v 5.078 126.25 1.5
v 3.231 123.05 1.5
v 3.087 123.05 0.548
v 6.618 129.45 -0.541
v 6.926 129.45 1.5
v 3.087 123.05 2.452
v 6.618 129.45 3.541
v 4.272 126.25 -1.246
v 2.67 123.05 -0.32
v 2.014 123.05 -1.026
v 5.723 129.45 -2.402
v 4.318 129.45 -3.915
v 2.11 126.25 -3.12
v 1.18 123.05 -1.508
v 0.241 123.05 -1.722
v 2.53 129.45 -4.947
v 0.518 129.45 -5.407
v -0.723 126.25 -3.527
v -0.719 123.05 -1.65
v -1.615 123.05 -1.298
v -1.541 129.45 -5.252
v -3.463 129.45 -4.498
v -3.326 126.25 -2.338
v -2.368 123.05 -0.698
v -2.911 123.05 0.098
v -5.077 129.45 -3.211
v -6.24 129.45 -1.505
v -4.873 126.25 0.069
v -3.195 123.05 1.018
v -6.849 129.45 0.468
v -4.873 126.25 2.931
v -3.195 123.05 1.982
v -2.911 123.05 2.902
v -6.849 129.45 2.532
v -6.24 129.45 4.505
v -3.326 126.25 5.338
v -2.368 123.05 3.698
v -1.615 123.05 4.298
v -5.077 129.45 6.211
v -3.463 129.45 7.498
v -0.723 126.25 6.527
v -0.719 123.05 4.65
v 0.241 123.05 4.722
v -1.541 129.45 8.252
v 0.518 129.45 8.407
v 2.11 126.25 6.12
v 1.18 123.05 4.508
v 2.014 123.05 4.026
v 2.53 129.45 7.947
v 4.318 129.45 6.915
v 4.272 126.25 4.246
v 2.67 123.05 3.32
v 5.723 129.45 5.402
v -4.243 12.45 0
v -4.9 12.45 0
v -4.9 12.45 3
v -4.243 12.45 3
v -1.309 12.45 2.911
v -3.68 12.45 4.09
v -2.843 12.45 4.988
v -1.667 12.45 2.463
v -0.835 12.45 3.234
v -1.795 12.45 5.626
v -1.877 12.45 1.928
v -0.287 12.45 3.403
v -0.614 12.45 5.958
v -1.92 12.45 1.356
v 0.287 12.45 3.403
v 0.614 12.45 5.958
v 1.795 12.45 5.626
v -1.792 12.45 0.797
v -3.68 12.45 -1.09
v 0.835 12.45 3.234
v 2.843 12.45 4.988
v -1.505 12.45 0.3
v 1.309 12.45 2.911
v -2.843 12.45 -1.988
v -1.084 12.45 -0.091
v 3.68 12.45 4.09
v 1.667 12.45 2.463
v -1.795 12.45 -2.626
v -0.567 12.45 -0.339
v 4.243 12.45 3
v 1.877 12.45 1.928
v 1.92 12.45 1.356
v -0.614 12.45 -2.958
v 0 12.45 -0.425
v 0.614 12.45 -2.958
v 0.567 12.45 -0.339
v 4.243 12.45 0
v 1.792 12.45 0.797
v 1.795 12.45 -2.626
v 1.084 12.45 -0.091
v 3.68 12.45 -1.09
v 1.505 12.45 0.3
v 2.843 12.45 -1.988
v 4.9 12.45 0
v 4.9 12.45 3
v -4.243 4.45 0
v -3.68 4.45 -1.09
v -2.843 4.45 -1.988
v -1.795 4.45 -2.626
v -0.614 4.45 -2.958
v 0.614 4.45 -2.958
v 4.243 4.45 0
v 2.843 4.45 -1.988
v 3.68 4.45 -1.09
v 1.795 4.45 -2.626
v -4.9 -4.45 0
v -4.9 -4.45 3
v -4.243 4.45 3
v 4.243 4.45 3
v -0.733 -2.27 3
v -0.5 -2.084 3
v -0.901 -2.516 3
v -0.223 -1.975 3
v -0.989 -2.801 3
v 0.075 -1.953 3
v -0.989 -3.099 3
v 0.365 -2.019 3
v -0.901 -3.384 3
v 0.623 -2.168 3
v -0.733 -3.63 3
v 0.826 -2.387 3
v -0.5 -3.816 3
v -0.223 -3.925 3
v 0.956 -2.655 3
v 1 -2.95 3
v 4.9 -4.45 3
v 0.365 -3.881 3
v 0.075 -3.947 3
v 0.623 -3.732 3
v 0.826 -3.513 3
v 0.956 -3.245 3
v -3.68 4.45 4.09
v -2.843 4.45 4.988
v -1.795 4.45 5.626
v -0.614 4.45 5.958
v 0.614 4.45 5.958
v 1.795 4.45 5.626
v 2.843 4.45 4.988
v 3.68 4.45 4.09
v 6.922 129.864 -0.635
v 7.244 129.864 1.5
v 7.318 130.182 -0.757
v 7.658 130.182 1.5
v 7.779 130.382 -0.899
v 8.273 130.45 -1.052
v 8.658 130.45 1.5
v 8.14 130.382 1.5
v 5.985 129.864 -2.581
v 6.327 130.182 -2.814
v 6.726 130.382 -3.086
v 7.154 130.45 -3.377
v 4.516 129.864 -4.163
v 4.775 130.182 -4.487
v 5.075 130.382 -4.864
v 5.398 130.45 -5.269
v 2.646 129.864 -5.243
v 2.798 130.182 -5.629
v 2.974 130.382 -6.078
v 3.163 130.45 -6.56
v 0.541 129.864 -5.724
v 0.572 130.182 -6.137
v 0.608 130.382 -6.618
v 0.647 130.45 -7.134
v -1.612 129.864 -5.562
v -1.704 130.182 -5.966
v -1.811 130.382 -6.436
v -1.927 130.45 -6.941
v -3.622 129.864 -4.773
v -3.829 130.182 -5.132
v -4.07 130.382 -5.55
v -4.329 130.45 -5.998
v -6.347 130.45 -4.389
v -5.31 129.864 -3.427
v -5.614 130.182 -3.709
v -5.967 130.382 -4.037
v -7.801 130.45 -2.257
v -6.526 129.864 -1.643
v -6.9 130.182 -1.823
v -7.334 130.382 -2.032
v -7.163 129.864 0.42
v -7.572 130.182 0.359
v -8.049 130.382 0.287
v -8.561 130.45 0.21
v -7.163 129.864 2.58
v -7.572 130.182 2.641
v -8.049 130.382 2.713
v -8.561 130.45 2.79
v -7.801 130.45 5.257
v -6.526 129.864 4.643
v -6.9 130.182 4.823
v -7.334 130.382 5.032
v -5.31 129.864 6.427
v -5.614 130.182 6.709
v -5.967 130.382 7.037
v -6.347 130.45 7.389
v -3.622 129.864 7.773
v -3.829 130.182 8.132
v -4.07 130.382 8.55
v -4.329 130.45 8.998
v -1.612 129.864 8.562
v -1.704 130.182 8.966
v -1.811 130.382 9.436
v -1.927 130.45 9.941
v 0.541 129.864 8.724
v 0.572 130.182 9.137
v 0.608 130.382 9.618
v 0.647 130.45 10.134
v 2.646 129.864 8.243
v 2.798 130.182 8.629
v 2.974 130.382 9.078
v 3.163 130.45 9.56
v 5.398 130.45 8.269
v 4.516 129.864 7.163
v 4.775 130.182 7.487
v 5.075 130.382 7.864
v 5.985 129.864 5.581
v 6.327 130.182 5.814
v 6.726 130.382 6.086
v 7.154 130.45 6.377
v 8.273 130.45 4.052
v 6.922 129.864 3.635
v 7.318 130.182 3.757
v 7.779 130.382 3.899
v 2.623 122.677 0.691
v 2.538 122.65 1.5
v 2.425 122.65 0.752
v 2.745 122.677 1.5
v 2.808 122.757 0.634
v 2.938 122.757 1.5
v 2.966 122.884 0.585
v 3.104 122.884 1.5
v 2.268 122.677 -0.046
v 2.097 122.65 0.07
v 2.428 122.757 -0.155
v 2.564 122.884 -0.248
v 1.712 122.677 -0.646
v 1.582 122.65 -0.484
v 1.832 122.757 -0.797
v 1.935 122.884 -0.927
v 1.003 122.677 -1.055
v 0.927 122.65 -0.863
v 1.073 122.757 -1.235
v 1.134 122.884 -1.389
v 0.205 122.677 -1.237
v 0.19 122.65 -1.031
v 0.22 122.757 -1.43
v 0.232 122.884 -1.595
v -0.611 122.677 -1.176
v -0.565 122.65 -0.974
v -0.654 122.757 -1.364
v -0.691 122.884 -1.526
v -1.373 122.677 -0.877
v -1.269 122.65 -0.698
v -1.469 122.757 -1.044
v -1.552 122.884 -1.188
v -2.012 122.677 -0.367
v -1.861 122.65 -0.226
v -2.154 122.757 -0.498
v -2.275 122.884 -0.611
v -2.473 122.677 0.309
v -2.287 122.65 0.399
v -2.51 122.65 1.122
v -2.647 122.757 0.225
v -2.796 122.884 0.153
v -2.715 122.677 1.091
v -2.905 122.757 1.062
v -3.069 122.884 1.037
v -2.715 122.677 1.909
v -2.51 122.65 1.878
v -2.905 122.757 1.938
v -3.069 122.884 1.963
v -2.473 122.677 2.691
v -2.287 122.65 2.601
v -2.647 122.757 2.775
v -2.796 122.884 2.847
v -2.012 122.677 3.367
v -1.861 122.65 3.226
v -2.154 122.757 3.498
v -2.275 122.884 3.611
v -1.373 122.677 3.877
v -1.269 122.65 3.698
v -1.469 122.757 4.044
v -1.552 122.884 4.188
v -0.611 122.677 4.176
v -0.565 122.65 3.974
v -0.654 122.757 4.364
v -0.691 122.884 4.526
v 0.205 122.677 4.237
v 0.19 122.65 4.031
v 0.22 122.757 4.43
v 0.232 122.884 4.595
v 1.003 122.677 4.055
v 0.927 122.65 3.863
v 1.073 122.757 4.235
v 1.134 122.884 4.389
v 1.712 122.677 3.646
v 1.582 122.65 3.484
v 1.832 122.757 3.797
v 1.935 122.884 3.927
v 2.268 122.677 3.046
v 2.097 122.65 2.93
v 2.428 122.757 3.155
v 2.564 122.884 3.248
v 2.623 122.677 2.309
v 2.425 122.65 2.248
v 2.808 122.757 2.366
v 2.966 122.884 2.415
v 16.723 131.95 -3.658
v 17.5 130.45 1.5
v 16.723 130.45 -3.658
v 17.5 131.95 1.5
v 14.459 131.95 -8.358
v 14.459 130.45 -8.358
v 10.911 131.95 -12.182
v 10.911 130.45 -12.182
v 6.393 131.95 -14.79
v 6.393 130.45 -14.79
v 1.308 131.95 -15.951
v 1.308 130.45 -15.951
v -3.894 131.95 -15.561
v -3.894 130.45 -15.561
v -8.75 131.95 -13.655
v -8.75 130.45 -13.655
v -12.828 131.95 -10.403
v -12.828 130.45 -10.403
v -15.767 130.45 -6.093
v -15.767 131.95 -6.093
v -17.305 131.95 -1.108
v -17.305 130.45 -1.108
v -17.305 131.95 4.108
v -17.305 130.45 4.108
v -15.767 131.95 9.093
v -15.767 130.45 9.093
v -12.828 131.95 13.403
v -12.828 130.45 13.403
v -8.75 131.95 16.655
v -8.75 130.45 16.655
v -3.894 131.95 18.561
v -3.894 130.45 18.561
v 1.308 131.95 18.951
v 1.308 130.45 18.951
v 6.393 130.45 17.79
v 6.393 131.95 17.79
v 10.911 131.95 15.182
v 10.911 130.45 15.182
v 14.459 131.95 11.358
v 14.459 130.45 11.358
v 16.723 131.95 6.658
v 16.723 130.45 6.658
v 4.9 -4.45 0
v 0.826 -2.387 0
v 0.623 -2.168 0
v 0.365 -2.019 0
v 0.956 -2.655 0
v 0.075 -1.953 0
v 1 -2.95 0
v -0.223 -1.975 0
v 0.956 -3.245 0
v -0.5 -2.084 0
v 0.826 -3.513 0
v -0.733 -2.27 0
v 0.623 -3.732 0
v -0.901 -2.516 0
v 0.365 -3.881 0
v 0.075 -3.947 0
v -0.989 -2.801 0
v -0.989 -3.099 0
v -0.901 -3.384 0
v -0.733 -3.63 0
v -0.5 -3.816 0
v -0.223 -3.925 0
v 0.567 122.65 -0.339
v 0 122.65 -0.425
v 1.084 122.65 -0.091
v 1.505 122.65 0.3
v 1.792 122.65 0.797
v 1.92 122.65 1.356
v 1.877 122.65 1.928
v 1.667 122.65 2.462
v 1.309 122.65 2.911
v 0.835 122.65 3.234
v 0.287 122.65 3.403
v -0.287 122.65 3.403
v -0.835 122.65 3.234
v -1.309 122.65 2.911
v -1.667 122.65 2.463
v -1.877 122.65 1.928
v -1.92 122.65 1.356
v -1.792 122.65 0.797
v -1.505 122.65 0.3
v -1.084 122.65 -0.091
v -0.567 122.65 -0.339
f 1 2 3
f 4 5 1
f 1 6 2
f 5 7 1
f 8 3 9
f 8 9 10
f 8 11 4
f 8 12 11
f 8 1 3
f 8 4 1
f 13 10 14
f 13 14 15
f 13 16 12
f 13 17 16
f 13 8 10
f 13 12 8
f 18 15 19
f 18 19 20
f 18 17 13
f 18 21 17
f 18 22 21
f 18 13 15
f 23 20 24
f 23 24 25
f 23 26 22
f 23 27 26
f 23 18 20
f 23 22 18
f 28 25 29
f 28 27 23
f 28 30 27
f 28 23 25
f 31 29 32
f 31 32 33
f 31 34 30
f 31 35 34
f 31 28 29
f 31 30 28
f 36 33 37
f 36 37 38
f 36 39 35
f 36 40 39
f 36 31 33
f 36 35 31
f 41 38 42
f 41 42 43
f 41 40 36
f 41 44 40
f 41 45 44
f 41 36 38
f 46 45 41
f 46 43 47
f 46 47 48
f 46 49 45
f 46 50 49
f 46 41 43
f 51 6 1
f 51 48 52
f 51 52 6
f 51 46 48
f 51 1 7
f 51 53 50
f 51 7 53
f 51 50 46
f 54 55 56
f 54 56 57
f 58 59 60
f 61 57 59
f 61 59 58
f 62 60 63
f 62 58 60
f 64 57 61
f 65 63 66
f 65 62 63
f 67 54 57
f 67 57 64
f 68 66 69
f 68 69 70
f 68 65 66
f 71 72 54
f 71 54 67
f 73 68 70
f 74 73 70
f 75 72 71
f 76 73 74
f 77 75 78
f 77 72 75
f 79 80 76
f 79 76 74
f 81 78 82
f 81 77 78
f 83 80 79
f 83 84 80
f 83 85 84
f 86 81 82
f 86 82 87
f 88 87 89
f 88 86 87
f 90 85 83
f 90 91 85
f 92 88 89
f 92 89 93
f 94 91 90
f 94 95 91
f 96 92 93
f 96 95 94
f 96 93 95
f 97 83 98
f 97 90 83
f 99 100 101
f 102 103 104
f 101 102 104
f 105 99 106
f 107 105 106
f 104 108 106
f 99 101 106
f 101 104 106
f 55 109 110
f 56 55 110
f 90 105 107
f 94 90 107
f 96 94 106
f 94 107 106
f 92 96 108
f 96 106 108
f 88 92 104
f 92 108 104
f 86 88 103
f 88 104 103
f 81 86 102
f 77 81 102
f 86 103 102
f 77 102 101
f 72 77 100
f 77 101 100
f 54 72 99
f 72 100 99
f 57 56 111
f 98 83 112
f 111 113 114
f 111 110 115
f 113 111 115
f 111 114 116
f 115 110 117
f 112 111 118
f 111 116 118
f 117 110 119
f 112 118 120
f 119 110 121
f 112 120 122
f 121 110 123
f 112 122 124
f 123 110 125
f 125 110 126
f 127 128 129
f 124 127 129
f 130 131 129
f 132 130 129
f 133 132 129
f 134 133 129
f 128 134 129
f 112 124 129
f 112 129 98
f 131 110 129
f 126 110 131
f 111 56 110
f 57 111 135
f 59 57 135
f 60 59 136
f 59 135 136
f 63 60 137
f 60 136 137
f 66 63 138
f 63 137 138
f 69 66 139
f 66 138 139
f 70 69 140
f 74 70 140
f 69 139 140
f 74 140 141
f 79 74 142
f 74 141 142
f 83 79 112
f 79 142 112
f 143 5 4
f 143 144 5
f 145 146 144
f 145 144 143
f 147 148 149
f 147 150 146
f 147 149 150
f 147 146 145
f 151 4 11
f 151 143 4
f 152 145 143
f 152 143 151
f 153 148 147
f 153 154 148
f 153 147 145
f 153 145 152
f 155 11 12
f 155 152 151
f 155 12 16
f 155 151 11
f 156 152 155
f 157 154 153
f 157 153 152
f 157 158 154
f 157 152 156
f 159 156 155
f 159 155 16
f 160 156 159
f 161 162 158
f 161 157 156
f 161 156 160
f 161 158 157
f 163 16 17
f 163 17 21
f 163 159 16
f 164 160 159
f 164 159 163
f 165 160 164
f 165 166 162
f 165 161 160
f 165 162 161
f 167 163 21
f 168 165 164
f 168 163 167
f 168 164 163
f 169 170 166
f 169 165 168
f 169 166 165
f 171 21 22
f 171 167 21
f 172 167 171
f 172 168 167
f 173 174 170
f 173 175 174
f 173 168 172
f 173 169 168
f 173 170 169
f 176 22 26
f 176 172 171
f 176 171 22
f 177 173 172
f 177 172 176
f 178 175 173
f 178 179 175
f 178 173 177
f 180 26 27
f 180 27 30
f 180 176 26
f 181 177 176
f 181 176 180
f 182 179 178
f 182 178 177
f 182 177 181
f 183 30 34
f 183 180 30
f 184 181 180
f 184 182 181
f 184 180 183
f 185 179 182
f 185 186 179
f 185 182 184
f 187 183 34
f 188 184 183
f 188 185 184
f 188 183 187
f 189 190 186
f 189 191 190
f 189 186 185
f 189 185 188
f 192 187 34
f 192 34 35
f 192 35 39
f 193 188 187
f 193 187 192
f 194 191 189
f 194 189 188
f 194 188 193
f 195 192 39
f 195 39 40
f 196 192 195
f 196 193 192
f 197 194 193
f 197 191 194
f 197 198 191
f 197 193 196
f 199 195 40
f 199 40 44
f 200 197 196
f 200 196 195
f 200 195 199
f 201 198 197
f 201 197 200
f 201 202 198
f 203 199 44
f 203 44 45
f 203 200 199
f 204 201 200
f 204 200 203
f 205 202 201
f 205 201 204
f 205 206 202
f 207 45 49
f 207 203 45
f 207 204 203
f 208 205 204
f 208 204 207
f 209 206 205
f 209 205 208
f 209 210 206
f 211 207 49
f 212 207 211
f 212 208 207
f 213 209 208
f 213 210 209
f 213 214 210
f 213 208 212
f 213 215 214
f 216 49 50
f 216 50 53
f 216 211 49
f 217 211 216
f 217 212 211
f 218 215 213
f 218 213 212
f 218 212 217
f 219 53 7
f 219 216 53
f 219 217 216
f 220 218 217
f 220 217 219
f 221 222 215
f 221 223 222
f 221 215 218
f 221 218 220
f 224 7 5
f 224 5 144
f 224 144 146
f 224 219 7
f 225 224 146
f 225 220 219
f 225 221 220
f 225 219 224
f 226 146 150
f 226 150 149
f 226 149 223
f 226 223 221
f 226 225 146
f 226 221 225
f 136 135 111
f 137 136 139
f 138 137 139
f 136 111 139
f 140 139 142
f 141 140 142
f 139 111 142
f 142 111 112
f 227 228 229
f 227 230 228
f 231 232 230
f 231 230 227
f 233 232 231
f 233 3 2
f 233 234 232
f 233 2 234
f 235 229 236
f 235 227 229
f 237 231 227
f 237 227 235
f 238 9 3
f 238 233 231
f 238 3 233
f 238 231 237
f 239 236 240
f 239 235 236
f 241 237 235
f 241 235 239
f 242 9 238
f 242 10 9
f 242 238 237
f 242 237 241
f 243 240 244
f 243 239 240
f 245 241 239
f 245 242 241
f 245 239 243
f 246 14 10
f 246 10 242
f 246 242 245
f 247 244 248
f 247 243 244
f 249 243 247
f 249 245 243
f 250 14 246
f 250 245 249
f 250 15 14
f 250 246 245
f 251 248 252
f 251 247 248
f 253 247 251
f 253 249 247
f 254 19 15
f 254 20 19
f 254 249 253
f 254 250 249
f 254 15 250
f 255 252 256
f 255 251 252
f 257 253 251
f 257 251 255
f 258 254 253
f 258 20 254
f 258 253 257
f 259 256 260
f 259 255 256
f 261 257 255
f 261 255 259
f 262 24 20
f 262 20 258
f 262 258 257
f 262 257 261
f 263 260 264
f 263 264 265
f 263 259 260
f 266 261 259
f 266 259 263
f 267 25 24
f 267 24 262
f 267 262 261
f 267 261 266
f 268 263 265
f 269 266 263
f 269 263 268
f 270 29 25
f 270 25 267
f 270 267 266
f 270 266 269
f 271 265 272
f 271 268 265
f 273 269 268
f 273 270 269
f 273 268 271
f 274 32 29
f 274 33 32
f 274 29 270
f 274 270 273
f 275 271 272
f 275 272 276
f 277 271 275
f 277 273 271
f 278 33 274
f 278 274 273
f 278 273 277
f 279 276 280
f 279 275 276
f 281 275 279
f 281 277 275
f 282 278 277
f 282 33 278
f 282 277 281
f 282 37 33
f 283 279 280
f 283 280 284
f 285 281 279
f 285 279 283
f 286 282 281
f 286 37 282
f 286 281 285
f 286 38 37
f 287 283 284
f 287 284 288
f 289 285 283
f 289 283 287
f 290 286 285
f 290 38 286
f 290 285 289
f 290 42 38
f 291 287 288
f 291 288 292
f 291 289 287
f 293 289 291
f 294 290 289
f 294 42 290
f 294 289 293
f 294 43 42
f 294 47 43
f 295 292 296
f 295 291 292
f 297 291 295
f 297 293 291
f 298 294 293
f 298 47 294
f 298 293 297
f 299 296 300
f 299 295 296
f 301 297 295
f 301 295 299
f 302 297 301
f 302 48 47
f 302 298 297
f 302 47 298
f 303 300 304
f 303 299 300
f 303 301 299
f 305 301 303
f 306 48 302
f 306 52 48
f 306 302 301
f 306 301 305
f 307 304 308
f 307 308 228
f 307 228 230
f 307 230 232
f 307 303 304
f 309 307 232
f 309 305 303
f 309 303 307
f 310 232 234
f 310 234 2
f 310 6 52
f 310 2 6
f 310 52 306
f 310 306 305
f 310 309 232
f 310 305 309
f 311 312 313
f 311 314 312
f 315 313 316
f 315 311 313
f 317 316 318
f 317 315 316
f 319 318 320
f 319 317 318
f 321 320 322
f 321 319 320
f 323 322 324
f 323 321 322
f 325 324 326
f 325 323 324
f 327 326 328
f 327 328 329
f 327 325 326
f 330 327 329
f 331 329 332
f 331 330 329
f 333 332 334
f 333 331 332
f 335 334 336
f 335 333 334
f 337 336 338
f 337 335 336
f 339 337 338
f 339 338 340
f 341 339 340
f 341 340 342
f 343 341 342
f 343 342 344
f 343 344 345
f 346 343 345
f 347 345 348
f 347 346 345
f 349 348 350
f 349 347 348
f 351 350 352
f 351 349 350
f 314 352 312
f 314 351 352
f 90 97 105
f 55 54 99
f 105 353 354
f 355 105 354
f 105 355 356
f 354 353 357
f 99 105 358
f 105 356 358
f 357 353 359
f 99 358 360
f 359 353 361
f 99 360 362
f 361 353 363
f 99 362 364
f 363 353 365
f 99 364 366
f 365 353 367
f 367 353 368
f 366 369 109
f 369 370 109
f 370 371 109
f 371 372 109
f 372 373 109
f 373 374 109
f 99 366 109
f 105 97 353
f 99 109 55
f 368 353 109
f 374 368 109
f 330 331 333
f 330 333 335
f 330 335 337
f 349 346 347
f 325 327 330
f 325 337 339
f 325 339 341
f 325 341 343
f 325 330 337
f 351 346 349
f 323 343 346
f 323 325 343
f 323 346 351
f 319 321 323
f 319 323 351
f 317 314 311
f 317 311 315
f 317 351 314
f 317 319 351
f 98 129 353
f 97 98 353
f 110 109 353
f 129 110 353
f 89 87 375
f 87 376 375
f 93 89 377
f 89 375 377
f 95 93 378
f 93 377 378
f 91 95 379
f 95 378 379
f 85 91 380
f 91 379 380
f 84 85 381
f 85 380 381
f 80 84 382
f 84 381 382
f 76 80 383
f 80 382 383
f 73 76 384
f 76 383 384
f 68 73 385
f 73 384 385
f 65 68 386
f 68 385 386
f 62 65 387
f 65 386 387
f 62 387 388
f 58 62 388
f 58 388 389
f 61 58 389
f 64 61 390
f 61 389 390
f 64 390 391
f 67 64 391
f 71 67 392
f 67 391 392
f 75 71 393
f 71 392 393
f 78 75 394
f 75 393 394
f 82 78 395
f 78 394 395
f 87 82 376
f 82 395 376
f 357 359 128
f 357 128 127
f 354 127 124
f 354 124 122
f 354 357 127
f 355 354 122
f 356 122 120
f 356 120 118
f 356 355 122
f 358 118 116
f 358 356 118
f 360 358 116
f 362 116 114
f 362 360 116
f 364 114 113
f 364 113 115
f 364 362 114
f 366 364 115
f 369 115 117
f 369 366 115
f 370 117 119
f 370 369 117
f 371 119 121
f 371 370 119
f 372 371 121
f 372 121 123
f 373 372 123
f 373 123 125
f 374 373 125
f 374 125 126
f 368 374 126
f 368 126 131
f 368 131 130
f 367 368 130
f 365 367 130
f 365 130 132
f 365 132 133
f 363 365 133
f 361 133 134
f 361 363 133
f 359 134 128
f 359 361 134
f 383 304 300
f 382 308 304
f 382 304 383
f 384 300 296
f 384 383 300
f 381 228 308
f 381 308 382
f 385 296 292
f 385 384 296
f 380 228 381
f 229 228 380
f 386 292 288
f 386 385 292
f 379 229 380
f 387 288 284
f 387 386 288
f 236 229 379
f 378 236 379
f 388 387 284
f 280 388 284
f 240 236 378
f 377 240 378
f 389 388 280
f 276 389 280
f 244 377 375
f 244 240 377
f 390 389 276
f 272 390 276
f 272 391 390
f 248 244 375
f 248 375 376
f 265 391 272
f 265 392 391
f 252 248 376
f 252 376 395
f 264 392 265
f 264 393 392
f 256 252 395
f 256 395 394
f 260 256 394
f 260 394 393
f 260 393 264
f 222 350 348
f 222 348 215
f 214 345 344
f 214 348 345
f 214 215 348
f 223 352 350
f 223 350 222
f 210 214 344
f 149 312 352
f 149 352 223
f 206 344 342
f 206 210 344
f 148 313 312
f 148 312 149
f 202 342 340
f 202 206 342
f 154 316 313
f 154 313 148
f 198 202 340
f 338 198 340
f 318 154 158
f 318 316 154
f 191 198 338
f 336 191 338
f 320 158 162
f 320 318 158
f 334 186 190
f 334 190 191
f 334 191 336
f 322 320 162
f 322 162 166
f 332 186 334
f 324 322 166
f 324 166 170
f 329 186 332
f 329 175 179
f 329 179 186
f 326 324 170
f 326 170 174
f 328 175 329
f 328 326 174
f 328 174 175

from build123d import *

# Parameters (mm, degrees)
SKETCH1_W           = 9.8
SKETCH1_H           = 8.9
SKETCH1_R           = 1
BOSS_EXTRUDE2_DEPTH = 3
BOSS_EXTRUDE4_DEPTH = 10
SKETCH4_R           = 1.925
BOSS_EXTRUDE5_DEPTH = 116
CUT_EXTRUDE1_START  = -2
CUT_EXTRUDE1_DEPTH  = 2
BOSS_EXTRUDE6_REACH = 122.306
SKETCH9_R           = 1.925


with BuildPart() as part:
    # Sketch1 → Boss-Extrude2 (new body)
    with BuildSketch(Plane.XY):
        Rectangle(SKETCH1_W, SKETCH1_H)
        with Locations((0, -2.95)):
            Circle(SKETCH1_R, mode=Mode.SUBTRACT)
    extrude(amount=BOSS_EXTRUDE2_DEPTH)

    # Sketch3 → Boss-Extrude4 (add)
    with BuildSketch(Plane(origin=(0, 4.45, 0), x_dir=(1, 0, 0), z_dir=(0, 1, 0))):
        with BuildLine():
            Line((4.9, -3), (4.9, 0))
            Line((4.9, 0), (4.242640687, 0))
            ThreePointArc((4.242640687, 0), (0, 3), (-4.242640687, 0))
            Line((-4.242640687, 0), (-4.9, 0))
            Line((-4.9, 0), (-4.9, -3))
            Line((-4.9, -3), (-4.242640687, -3))
            ThreePointArc((-4.242640687, -3), (0, -6), (4.242640687, -3))
            Line((4.242640687, -3), (4.9, -3))
        make_face()
    extrude(amount=BOSS_EXTRUDE4_DEPTH)

    # Sketch4 → Boss-Extrude5 (add)
    with BuildSketch(Plane(origin=(0, 14.45, 0), x_dir=(1, 0, 0), z_dir=(0, 1, 0))):
        with Locations(Location((0, -1.5, 0), (0, 0, 90))):
            Circle(SKETCH4_R)
    extrude(amount=BOSS_EXTRUDE5_DEPTH)

    # Sketch7 → Revolve1 (revolve)
    with BuildSketch(Plane.XY.offset(1.5)):
        with BuildLine():
            Line((3.230940108, 123.05), (6.92598183, 129.45))
            ThreePointArc((6.92598183, 129.45), (7.658032638, 130.182050808), (8.658032638, 130.45))
            Line((8.658032638, 130.45), (17.5, 130.45))
            Line((17.5, 130.45), (17.5, 131.95))
            Line((17.5, 131.95), (0, 131.95))
            Line((0, 131.95), (0, 130.45))
            Line((0, 130.45), (1.925, 130.45))
            Line((1.925, 130.45), (1.925, 122.65))
            Line((1.925, 122.65), (2.538119785, 122.65))
            ThreePointArc((2.538119785, 122.65), (2.938119785, 122.757179677), (3.230940108, 123.05))
        make_face()
    revolve(axis=Axis((0, 130.45, 1.5), (0, 1, 0)))

    # Sketch8 → Cut-Extrude1 (cut)
    with BuildSketch(Plane(origin=(0, 14.45, 0), x_dir=(1, 0, 0), z_dir=(0, 1, 0)).offset(CUT_EXTRUDE1_START)):
        with BuildLine():
            Line((-4.242640687, 0), (-4.9, 0))
            Line((-4.9, 0), (-4.9, -3))
            Line((-4.9, -3), (-4.242640687, -3))
            ThreePointArc((-4.242640687, -3), (0, -6), (4.242640687, -3))
            Line((4.242640687, -3), (4.9, -3))
            Line((4.9, -3), (4.9, 0))
            Line((4.9, 0), (4.242640687, 0))
            ThreePointArc((4.242640687, 0), (0, 3), (-4.242640687, 0))
        make_face()
    extrude(amount=CUT_EXTRUDE1_DEPTH, mode=Mode.SUBTRACT)


with BuildPart() as cut_extrude1_piece_1:
    # of the separate pieces the step leaves, piece 1, a body of its own (cut_extrude1_pieces)
    add(part.part.solids().sort_by_distance((0, 14.45, -0.425))[0])


with BuildPart() as cut_extrude1_piece_2:
    # of the separate pieces the step leaves, piece 2, a body of its own (cut_extrude1_pieces)
    add(part.part.solids().sort_by_distance((4.9, -4.45, 0))[0])

    # Sketch9 → Boss-Extrude6 (add, up to next)
    with BuildSketch(Plane.XZ.offset(-14.45), mode=Mode.PRIVATE) as boss_extrude6_sk1:
        with Locations(Location((0, 1.5, 0), (0, 0, 270))):
            Circle(SKETCH9_R)
    boss_extrude6_tool1 = extrude(boss_extrude6_sk1.sketch, amount=BOSS_EXTRUDE6_REACH, mode=Mode.PRIVATE) - cut_extrude1_piece_2.part

    add(cut_extrude1_piece_1.part)  # Boss-Extrude6 merges Cut-Extrude1 piece 1
    add(boss_extrude6_tool1.solids().sort_by_distance((0, 14.45, 1.5))[0])


solid = cut_extrude1_piece_2.part
